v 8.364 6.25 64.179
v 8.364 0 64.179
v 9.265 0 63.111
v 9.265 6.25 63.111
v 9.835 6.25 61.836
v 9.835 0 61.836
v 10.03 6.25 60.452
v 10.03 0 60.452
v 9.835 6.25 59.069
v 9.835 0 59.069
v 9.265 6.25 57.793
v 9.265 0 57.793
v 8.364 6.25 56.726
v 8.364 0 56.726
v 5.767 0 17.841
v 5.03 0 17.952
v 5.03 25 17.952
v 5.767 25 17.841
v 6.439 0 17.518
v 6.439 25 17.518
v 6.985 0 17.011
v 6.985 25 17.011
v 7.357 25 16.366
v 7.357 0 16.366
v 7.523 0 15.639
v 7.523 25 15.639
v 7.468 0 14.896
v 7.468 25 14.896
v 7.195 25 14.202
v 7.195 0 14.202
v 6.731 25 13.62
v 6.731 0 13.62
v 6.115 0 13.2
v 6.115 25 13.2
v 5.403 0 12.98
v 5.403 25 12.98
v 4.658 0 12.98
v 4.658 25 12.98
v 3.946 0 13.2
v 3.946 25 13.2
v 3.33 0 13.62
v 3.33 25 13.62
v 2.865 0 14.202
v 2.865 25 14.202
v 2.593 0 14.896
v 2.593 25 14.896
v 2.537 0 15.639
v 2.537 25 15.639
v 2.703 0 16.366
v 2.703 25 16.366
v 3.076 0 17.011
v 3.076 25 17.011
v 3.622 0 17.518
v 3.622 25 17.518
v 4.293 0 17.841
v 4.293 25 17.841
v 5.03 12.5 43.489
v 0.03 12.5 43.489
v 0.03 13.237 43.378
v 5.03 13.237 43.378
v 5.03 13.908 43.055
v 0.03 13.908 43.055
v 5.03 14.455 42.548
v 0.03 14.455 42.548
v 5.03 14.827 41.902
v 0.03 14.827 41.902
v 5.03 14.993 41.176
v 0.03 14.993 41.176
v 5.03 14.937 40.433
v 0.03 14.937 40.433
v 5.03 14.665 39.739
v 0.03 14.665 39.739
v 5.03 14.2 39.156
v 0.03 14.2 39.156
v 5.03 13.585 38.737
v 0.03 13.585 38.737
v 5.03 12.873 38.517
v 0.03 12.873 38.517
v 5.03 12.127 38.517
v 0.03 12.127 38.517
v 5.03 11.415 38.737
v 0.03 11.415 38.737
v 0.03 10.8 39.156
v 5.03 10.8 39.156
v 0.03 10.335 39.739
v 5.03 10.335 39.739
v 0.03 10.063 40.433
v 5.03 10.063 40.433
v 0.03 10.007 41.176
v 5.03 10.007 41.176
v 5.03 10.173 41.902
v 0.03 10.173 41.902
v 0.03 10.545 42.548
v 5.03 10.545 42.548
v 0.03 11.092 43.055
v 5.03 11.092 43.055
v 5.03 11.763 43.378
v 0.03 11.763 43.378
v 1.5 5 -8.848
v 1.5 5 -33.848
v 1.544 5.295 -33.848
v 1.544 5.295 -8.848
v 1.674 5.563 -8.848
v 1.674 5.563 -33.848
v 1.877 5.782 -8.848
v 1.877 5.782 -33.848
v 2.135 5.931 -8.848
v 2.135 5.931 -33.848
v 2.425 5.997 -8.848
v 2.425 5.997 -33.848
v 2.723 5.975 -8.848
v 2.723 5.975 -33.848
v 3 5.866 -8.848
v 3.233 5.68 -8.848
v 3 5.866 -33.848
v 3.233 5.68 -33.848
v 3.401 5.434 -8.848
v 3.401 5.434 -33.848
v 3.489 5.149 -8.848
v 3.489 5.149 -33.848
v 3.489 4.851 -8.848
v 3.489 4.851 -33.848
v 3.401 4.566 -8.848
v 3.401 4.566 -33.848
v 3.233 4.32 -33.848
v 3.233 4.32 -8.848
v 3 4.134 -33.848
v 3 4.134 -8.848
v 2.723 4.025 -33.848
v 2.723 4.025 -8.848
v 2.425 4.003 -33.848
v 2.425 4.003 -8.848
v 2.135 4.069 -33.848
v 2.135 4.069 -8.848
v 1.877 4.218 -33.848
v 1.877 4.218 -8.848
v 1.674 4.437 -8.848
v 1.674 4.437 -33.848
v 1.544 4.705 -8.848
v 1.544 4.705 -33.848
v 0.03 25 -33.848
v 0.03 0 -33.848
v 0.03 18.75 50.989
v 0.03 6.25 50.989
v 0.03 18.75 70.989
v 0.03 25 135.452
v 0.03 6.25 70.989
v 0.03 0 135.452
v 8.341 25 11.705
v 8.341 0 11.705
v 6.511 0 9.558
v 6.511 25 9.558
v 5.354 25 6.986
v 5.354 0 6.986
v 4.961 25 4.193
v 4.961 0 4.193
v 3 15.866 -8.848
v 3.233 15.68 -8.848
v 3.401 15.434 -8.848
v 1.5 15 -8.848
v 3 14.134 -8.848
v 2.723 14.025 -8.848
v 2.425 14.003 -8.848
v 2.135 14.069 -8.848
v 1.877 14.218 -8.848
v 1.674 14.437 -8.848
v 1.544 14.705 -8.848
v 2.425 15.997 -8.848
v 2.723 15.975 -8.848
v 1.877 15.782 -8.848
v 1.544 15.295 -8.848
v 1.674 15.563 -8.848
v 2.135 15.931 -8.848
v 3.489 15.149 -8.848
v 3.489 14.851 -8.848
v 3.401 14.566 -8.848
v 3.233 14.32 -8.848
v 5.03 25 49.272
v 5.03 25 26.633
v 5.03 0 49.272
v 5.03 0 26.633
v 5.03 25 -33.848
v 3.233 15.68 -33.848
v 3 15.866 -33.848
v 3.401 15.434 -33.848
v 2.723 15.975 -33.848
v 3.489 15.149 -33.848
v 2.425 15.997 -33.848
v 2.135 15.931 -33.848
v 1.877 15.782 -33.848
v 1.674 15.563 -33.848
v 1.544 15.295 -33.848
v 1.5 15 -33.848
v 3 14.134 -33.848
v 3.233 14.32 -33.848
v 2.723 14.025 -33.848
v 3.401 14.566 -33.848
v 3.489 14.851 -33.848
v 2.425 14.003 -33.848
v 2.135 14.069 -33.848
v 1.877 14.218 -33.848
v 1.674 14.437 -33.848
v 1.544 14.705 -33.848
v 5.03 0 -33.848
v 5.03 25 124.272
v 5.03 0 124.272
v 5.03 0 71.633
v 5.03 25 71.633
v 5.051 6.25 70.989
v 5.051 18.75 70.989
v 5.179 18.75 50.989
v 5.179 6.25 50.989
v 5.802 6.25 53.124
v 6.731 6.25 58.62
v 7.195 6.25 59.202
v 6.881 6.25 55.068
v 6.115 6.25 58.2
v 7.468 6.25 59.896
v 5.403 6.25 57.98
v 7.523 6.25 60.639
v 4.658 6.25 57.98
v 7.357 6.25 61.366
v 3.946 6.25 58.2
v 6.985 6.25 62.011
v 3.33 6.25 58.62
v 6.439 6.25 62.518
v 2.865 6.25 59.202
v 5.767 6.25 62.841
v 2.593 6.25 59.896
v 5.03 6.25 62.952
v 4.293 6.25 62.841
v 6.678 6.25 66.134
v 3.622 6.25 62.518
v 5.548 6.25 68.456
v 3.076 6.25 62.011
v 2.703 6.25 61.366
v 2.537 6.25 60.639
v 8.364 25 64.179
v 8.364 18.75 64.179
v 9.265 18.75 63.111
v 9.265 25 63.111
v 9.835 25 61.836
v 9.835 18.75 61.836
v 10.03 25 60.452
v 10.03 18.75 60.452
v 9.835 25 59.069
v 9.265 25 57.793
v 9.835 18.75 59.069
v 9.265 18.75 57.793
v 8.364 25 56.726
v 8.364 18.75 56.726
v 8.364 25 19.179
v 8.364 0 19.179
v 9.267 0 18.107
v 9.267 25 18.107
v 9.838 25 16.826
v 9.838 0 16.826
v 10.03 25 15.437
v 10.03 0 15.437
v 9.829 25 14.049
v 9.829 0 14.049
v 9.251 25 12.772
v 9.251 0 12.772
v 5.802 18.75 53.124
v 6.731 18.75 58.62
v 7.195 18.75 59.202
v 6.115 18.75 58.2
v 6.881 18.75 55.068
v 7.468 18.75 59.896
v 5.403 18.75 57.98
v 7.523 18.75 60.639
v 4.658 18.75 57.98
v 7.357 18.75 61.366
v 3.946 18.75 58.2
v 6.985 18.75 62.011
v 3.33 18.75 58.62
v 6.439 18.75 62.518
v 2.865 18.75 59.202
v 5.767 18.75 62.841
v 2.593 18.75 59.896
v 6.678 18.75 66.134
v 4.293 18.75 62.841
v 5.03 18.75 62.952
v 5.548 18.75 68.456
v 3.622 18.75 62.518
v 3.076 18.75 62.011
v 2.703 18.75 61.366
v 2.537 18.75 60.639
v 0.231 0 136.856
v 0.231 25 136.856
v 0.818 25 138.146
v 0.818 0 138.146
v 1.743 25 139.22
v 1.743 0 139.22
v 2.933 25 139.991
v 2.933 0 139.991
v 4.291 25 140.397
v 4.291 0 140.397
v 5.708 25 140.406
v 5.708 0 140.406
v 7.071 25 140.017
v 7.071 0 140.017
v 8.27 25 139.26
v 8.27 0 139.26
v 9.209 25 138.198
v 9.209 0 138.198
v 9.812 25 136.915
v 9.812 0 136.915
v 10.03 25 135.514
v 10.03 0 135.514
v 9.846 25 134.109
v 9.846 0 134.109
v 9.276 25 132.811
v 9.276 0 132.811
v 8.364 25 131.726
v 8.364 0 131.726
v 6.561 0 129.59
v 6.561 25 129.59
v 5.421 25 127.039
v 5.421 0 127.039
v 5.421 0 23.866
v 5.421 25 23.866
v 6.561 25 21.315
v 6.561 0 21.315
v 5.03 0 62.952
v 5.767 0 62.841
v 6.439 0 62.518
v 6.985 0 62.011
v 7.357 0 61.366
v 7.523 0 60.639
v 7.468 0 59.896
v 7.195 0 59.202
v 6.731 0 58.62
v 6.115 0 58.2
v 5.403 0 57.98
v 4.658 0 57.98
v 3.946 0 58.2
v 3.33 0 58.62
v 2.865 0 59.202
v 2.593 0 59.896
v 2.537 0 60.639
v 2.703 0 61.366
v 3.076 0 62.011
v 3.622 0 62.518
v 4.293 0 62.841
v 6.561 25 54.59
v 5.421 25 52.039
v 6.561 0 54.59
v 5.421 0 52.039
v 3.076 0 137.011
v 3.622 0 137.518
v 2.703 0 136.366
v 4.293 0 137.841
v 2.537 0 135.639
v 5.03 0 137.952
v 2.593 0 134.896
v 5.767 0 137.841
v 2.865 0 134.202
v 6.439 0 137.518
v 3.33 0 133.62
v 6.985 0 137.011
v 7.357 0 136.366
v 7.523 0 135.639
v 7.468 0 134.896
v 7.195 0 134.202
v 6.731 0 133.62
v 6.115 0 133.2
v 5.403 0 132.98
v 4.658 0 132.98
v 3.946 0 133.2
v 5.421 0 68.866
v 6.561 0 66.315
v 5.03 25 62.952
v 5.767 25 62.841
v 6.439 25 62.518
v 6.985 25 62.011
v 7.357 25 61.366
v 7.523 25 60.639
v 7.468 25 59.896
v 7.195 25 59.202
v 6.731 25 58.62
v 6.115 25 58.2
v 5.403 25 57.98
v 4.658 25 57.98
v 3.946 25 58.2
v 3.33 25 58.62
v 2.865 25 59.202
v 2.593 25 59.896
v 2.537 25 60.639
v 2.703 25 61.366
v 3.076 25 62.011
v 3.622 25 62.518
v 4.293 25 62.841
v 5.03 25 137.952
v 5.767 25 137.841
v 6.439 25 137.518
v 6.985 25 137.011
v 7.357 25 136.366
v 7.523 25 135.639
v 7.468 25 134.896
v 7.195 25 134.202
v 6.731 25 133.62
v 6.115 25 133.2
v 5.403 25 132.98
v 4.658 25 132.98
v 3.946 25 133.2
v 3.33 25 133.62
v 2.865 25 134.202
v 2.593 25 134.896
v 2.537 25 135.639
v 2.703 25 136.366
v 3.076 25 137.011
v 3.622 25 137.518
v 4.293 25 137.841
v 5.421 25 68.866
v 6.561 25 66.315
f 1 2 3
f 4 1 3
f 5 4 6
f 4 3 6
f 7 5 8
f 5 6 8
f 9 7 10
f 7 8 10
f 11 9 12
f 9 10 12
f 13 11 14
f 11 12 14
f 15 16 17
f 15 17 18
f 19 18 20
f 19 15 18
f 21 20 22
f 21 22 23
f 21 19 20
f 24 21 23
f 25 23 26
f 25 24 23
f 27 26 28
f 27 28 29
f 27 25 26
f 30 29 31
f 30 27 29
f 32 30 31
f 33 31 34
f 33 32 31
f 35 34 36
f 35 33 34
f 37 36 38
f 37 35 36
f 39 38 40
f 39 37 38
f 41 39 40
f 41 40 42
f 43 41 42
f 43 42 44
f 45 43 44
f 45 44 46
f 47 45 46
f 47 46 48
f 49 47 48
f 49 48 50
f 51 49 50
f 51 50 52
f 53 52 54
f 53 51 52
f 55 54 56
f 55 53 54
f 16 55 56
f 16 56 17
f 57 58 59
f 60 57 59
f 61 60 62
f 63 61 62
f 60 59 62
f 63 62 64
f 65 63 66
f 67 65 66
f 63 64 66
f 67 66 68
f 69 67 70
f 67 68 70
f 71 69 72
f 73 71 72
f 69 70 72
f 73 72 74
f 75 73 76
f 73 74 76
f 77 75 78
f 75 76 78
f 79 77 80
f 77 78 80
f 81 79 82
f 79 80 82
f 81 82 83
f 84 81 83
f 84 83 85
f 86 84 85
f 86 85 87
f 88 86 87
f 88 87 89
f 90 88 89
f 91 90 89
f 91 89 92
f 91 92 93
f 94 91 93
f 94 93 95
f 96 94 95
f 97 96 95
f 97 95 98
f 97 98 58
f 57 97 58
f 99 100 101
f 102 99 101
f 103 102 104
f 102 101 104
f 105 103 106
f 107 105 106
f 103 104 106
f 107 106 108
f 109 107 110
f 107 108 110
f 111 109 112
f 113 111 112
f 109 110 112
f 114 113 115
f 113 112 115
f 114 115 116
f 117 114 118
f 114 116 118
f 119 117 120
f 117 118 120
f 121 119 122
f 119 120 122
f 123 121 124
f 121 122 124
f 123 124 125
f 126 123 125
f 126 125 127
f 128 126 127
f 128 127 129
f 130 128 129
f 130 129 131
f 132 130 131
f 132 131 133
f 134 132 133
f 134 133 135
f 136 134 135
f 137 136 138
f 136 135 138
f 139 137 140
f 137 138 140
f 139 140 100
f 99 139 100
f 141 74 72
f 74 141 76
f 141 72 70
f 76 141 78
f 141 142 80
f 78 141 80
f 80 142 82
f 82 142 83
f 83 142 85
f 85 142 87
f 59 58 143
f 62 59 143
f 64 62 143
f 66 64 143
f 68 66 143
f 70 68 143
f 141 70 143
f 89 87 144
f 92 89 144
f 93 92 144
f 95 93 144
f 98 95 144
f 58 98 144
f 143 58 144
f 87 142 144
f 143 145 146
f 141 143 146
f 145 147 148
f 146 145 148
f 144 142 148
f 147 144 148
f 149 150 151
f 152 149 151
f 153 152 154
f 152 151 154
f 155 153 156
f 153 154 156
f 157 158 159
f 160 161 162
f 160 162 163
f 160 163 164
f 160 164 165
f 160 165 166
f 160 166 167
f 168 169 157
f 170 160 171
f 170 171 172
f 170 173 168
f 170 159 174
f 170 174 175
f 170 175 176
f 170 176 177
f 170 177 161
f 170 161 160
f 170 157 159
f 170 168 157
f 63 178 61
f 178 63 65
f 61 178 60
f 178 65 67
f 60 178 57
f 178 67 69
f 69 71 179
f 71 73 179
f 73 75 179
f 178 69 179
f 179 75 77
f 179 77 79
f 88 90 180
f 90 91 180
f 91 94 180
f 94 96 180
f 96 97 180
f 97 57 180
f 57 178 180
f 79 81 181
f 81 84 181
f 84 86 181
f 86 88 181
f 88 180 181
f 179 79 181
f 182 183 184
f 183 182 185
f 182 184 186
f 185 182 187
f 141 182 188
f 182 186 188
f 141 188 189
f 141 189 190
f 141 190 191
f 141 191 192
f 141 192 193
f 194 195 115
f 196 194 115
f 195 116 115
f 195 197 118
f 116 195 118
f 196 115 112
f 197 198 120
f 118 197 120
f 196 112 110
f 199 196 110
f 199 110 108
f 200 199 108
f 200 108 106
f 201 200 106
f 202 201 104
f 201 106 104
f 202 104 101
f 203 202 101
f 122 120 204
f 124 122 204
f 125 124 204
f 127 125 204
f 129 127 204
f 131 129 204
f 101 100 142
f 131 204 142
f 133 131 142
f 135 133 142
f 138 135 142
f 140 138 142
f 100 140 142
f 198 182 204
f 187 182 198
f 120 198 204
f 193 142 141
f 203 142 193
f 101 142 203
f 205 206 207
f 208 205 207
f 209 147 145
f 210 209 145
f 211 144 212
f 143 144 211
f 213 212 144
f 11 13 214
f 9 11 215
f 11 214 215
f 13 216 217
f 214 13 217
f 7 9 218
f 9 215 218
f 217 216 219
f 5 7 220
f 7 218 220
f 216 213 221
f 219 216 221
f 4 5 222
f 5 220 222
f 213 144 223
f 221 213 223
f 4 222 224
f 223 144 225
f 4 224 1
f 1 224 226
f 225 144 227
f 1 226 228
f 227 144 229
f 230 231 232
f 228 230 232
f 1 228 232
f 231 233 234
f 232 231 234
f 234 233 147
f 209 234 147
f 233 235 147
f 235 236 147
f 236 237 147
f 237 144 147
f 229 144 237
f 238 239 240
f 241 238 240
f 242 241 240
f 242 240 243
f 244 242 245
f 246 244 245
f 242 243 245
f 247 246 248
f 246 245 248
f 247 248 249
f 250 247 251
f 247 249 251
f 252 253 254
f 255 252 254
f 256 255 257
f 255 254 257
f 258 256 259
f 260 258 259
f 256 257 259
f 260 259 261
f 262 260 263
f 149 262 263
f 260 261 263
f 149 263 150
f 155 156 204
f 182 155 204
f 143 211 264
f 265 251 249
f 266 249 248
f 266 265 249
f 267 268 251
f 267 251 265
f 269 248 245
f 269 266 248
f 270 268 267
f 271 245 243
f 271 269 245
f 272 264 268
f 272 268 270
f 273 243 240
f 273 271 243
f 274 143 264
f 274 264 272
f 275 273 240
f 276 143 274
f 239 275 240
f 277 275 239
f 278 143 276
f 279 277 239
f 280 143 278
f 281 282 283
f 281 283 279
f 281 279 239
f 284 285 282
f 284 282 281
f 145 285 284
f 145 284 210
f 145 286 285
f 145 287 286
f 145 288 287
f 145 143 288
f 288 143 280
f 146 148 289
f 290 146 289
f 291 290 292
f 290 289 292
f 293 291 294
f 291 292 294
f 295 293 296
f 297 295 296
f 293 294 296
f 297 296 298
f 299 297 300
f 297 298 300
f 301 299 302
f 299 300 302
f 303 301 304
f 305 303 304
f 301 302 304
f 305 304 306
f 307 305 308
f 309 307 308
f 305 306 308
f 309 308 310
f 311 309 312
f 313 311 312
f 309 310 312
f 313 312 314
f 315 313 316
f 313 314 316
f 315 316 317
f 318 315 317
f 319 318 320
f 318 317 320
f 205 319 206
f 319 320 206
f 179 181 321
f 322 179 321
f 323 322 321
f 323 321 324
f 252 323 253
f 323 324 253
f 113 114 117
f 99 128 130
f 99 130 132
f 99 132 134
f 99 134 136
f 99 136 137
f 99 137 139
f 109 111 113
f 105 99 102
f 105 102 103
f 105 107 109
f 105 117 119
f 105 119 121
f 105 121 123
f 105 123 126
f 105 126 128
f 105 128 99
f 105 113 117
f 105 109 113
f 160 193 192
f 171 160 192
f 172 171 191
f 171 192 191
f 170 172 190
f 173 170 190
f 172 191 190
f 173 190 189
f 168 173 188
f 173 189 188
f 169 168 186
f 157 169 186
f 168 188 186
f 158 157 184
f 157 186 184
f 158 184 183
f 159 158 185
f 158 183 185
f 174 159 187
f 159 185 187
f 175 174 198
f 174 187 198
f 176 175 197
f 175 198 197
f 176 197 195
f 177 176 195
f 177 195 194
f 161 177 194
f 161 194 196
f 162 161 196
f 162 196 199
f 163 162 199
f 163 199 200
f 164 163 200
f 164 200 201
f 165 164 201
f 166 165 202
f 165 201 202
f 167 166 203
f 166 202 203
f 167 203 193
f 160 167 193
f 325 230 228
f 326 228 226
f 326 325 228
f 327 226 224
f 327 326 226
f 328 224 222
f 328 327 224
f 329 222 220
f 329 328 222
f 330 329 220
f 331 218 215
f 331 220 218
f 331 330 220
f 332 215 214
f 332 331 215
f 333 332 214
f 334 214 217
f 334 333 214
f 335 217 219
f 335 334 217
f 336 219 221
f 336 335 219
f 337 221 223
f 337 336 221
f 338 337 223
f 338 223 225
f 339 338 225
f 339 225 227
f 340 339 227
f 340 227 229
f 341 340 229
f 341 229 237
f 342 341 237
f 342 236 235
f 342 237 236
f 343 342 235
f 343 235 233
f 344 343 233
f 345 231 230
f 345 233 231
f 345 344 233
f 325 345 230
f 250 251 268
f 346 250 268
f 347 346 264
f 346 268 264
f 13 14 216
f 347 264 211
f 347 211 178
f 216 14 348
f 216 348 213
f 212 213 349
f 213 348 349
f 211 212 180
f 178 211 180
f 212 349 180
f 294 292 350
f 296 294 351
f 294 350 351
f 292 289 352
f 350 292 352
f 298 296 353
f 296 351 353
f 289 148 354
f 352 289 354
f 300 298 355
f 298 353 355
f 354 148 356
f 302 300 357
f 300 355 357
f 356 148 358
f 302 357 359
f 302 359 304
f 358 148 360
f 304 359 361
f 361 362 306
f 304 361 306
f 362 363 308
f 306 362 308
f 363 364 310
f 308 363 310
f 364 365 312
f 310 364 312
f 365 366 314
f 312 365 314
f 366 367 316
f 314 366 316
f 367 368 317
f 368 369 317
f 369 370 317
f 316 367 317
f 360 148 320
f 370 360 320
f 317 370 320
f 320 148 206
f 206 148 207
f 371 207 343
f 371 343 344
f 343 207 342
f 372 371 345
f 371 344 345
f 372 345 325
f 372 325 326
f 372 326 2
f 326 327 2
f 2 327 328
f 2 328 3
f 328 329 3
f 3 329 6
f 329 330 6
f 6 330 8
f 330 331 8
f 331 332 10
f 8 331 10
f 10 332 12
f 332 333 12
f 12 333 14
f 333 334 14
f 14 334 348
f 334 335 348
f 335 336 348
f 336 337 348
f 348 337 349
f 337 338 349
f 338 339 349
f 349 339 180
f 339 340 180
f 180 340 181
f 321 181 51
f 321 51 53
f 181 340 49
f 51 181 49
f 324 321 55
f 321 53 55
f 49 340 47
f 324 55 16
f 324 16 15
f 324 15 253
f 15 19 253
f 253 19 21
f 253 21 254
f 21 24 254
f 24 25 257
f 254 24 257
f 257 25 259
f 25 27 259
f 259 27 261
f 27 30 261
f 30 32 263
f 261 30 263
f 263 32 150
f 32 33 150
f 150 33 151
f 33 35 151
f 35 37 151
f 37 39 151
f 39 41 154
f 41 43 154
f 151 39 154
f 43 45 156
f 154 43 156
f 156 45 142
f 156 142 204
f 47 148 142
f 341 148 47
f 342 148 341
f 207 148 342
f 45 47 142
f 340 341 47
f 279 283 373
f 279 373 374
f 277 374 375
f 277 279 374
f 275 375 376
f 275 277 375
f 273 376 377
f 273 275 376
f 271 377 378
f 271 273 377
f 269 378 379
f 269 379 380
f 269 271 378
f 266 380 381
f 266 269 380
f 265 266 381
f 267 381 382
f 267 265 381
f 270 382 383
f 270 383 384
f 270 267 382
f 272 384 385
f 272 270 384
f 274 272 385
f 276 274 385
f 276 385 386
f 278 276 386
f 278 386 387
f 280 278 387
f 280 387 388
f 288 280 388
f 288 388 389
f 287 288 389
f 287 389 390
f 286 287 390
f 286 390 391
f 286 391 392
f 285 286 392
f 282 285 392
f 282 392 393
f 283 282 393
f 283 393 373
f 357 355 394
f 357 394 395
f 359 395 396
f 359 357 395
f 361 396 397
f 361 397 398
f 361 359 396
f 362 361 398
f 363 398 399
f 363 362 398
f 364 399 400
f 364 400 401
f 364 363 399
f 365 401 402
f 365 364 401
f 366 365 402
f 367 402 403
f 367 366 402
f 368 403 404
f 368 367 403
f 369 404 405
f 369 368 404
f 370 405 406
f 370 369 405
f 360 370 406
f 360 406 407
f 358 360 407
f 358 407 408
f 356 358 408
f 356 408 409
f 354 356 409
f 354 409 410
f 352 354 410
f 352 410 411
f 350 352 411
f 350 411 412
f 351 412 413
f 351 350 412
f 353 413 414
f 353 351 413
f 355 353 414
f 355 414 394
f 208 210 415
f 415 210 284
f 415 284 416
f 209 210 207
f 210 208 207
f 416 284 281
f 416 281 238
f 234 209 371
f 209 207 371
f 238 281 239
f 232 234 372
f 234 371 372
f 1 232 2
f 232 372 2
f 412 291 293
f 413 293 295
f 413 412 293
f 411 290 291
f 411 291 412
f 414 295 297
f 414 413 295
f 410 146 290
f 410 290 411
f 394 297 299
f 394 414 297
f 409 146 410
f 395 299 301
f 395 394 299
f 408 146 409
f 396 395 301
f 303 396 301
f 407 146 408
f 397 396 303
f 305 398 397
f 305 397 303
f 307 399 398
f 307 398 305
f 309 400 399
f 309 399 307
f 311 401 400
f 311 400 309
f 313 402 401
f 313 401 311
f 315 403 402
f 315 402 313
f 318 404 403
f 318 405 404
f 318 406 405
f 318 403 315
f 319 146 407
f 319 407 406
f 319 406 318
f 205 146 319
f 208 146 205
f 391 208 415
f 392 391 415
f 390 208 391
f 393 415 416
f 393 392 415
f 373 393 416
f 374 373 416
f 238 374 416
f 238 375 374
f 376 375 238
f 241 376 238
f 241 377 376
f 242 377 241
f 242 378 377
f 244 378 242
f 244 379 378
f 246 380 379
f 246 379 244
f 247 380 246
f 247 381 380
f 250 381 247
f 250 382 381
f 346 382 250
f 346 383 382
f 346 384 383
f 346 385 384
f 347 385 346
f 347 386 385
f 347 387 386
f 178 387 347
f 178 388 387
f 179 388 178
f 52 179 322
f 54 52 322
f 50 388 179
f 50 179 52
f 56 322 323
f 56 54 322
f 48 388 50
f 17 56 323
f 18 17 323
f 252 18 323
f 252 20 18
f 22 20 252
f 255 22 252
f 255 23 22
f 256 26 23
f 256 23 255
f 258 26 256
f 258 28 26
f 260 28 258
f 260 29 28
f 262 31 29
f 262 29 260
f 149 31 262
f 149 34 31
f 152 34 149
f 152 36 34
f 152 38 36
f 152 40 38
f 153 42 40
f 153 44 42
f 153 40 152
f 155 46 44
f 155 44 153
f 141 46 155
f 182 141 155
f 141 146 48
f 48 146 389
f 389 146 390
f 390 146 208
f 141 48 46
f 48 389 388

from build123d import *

# Parameters (mm, degrees)
SKETCH2_R           = 2.5
BOSS_EXTRUDE1_DEPTH = 25
SKETCH3_R           = 1
CUT_EXTRUDE1_DEPTH  = 25
SKETCH6_R           = 2.5
SKETCH6_W           = 20
SKETCH6_H           = 12.5
CUT_EXTRUDE2_DEPTH  = 144.01010212


with BuildPart() as part:
    # Sketch2 → Boss-Extrude1 (new body)
    with BuildSketch(Plane(origin=(0, 0, 0), x_dir=(1, 0, 0), z_dir=(0, 1, 0))):
        with BuildLine():
            Line((0.030237901, 33.847554993), (0.030237901, -135.452445007))
            ThreePointArc((0.030237901, -135.452445007), (7.071479353, -140.016799653), (8.363571234, -131.725665044))
            ThreePointArc((8.363571234, -131.725665044), (5.901528609, -128.354588024), (5.030237901, -124.272105119))
            Line((5.030237901, -124.272105119), (5.030237901, -71.632784894))
            ThreePointArc((5.030237901, -71.632784894), (5.901528609, -67.55030199), (8.363571234, -64.179224969))
            ThreePointArc((8.363571234, -64.179224969), (10.030237901, -60.452445007), (8.363571234, -56.725665044))
            ThreePointArc((8.363571234, -56.725665044), (5.901528609, -53.354588024), (5.030237901, -49.272105119))
            Line((5.030237901, -49.272105119), (5.030237901, -26.632784894))
            ThreePointArc((5.030237901, -26.632784894), (5.901528609, -22.55030199), (8.363571234, -19.179224969))
            ThreePointArc((8.363571234, -19.179224969), (10.030214165, -15.437038677), (8.340541648, -11.705194134))
            ThreePointArc((8.340541648, -11.705194134), (5.841334205, -8.313005826), (4.961165626, -4.192534659))
            Line((4.961165626, -4.192534659), (5.030237901, 33.847554993))
            Line((5.030237901, 33.847554993), (0.030237901, 33.847554993))
        make_face()
        with Locations(Location((5.030237901, -15.452445007, 0), (0, 0, 270))):
            Circle(SKETCH2_R, mode=Mode.SUBTRACT)
        with Locations(Location((5.030237901, -135.452445007, 0), (0, 0, 270))):
            Circle(SKETCH2_R, mode=Mode.SUBTRACT)
        with Locations(Location((5.030237901, -60.452445007, 0), (0, 0, 270))):
            Circle(SKETCH2_R, mode=Mode.SUBTRACT)
    extrude(amount=BOSS_EXTRUDE1_DEPTH)

    # Sketch3 → Cut-Extrude1 (cut)
    with BuildSketch(Plane(origin=(0, 0, -33.847554993), x_dir=(-1, 0, 0), z_dir=(0, 0, -1))):
        with Locations((-2.5, 15)):
            Circle(SKETCH3_R)
        with Locations((-2.5, 5)):
            Circle(SKETCH3_R)
    extrude(amount=-CUT_EXTRUDE1_DEPTH, mode=Mode.SUBTRACT)

    # Sketch6 → Cut-Extrude2 (cut, through all)
    with BuildSketch(Plane.ZY.offset(-0.030237901)):
        with Locations((40.98910992, 12.5)):
            Circle(SKETCH6_R)
        with Locations((60.98910992, 12.5)):
            Rectangle(SKETCH6_W, SKETCH6_H)
    extrude(amount=-CUT_EXTRUDE2_DEPTH, mode=Mode.SUBTRACT)


solid = part.part
